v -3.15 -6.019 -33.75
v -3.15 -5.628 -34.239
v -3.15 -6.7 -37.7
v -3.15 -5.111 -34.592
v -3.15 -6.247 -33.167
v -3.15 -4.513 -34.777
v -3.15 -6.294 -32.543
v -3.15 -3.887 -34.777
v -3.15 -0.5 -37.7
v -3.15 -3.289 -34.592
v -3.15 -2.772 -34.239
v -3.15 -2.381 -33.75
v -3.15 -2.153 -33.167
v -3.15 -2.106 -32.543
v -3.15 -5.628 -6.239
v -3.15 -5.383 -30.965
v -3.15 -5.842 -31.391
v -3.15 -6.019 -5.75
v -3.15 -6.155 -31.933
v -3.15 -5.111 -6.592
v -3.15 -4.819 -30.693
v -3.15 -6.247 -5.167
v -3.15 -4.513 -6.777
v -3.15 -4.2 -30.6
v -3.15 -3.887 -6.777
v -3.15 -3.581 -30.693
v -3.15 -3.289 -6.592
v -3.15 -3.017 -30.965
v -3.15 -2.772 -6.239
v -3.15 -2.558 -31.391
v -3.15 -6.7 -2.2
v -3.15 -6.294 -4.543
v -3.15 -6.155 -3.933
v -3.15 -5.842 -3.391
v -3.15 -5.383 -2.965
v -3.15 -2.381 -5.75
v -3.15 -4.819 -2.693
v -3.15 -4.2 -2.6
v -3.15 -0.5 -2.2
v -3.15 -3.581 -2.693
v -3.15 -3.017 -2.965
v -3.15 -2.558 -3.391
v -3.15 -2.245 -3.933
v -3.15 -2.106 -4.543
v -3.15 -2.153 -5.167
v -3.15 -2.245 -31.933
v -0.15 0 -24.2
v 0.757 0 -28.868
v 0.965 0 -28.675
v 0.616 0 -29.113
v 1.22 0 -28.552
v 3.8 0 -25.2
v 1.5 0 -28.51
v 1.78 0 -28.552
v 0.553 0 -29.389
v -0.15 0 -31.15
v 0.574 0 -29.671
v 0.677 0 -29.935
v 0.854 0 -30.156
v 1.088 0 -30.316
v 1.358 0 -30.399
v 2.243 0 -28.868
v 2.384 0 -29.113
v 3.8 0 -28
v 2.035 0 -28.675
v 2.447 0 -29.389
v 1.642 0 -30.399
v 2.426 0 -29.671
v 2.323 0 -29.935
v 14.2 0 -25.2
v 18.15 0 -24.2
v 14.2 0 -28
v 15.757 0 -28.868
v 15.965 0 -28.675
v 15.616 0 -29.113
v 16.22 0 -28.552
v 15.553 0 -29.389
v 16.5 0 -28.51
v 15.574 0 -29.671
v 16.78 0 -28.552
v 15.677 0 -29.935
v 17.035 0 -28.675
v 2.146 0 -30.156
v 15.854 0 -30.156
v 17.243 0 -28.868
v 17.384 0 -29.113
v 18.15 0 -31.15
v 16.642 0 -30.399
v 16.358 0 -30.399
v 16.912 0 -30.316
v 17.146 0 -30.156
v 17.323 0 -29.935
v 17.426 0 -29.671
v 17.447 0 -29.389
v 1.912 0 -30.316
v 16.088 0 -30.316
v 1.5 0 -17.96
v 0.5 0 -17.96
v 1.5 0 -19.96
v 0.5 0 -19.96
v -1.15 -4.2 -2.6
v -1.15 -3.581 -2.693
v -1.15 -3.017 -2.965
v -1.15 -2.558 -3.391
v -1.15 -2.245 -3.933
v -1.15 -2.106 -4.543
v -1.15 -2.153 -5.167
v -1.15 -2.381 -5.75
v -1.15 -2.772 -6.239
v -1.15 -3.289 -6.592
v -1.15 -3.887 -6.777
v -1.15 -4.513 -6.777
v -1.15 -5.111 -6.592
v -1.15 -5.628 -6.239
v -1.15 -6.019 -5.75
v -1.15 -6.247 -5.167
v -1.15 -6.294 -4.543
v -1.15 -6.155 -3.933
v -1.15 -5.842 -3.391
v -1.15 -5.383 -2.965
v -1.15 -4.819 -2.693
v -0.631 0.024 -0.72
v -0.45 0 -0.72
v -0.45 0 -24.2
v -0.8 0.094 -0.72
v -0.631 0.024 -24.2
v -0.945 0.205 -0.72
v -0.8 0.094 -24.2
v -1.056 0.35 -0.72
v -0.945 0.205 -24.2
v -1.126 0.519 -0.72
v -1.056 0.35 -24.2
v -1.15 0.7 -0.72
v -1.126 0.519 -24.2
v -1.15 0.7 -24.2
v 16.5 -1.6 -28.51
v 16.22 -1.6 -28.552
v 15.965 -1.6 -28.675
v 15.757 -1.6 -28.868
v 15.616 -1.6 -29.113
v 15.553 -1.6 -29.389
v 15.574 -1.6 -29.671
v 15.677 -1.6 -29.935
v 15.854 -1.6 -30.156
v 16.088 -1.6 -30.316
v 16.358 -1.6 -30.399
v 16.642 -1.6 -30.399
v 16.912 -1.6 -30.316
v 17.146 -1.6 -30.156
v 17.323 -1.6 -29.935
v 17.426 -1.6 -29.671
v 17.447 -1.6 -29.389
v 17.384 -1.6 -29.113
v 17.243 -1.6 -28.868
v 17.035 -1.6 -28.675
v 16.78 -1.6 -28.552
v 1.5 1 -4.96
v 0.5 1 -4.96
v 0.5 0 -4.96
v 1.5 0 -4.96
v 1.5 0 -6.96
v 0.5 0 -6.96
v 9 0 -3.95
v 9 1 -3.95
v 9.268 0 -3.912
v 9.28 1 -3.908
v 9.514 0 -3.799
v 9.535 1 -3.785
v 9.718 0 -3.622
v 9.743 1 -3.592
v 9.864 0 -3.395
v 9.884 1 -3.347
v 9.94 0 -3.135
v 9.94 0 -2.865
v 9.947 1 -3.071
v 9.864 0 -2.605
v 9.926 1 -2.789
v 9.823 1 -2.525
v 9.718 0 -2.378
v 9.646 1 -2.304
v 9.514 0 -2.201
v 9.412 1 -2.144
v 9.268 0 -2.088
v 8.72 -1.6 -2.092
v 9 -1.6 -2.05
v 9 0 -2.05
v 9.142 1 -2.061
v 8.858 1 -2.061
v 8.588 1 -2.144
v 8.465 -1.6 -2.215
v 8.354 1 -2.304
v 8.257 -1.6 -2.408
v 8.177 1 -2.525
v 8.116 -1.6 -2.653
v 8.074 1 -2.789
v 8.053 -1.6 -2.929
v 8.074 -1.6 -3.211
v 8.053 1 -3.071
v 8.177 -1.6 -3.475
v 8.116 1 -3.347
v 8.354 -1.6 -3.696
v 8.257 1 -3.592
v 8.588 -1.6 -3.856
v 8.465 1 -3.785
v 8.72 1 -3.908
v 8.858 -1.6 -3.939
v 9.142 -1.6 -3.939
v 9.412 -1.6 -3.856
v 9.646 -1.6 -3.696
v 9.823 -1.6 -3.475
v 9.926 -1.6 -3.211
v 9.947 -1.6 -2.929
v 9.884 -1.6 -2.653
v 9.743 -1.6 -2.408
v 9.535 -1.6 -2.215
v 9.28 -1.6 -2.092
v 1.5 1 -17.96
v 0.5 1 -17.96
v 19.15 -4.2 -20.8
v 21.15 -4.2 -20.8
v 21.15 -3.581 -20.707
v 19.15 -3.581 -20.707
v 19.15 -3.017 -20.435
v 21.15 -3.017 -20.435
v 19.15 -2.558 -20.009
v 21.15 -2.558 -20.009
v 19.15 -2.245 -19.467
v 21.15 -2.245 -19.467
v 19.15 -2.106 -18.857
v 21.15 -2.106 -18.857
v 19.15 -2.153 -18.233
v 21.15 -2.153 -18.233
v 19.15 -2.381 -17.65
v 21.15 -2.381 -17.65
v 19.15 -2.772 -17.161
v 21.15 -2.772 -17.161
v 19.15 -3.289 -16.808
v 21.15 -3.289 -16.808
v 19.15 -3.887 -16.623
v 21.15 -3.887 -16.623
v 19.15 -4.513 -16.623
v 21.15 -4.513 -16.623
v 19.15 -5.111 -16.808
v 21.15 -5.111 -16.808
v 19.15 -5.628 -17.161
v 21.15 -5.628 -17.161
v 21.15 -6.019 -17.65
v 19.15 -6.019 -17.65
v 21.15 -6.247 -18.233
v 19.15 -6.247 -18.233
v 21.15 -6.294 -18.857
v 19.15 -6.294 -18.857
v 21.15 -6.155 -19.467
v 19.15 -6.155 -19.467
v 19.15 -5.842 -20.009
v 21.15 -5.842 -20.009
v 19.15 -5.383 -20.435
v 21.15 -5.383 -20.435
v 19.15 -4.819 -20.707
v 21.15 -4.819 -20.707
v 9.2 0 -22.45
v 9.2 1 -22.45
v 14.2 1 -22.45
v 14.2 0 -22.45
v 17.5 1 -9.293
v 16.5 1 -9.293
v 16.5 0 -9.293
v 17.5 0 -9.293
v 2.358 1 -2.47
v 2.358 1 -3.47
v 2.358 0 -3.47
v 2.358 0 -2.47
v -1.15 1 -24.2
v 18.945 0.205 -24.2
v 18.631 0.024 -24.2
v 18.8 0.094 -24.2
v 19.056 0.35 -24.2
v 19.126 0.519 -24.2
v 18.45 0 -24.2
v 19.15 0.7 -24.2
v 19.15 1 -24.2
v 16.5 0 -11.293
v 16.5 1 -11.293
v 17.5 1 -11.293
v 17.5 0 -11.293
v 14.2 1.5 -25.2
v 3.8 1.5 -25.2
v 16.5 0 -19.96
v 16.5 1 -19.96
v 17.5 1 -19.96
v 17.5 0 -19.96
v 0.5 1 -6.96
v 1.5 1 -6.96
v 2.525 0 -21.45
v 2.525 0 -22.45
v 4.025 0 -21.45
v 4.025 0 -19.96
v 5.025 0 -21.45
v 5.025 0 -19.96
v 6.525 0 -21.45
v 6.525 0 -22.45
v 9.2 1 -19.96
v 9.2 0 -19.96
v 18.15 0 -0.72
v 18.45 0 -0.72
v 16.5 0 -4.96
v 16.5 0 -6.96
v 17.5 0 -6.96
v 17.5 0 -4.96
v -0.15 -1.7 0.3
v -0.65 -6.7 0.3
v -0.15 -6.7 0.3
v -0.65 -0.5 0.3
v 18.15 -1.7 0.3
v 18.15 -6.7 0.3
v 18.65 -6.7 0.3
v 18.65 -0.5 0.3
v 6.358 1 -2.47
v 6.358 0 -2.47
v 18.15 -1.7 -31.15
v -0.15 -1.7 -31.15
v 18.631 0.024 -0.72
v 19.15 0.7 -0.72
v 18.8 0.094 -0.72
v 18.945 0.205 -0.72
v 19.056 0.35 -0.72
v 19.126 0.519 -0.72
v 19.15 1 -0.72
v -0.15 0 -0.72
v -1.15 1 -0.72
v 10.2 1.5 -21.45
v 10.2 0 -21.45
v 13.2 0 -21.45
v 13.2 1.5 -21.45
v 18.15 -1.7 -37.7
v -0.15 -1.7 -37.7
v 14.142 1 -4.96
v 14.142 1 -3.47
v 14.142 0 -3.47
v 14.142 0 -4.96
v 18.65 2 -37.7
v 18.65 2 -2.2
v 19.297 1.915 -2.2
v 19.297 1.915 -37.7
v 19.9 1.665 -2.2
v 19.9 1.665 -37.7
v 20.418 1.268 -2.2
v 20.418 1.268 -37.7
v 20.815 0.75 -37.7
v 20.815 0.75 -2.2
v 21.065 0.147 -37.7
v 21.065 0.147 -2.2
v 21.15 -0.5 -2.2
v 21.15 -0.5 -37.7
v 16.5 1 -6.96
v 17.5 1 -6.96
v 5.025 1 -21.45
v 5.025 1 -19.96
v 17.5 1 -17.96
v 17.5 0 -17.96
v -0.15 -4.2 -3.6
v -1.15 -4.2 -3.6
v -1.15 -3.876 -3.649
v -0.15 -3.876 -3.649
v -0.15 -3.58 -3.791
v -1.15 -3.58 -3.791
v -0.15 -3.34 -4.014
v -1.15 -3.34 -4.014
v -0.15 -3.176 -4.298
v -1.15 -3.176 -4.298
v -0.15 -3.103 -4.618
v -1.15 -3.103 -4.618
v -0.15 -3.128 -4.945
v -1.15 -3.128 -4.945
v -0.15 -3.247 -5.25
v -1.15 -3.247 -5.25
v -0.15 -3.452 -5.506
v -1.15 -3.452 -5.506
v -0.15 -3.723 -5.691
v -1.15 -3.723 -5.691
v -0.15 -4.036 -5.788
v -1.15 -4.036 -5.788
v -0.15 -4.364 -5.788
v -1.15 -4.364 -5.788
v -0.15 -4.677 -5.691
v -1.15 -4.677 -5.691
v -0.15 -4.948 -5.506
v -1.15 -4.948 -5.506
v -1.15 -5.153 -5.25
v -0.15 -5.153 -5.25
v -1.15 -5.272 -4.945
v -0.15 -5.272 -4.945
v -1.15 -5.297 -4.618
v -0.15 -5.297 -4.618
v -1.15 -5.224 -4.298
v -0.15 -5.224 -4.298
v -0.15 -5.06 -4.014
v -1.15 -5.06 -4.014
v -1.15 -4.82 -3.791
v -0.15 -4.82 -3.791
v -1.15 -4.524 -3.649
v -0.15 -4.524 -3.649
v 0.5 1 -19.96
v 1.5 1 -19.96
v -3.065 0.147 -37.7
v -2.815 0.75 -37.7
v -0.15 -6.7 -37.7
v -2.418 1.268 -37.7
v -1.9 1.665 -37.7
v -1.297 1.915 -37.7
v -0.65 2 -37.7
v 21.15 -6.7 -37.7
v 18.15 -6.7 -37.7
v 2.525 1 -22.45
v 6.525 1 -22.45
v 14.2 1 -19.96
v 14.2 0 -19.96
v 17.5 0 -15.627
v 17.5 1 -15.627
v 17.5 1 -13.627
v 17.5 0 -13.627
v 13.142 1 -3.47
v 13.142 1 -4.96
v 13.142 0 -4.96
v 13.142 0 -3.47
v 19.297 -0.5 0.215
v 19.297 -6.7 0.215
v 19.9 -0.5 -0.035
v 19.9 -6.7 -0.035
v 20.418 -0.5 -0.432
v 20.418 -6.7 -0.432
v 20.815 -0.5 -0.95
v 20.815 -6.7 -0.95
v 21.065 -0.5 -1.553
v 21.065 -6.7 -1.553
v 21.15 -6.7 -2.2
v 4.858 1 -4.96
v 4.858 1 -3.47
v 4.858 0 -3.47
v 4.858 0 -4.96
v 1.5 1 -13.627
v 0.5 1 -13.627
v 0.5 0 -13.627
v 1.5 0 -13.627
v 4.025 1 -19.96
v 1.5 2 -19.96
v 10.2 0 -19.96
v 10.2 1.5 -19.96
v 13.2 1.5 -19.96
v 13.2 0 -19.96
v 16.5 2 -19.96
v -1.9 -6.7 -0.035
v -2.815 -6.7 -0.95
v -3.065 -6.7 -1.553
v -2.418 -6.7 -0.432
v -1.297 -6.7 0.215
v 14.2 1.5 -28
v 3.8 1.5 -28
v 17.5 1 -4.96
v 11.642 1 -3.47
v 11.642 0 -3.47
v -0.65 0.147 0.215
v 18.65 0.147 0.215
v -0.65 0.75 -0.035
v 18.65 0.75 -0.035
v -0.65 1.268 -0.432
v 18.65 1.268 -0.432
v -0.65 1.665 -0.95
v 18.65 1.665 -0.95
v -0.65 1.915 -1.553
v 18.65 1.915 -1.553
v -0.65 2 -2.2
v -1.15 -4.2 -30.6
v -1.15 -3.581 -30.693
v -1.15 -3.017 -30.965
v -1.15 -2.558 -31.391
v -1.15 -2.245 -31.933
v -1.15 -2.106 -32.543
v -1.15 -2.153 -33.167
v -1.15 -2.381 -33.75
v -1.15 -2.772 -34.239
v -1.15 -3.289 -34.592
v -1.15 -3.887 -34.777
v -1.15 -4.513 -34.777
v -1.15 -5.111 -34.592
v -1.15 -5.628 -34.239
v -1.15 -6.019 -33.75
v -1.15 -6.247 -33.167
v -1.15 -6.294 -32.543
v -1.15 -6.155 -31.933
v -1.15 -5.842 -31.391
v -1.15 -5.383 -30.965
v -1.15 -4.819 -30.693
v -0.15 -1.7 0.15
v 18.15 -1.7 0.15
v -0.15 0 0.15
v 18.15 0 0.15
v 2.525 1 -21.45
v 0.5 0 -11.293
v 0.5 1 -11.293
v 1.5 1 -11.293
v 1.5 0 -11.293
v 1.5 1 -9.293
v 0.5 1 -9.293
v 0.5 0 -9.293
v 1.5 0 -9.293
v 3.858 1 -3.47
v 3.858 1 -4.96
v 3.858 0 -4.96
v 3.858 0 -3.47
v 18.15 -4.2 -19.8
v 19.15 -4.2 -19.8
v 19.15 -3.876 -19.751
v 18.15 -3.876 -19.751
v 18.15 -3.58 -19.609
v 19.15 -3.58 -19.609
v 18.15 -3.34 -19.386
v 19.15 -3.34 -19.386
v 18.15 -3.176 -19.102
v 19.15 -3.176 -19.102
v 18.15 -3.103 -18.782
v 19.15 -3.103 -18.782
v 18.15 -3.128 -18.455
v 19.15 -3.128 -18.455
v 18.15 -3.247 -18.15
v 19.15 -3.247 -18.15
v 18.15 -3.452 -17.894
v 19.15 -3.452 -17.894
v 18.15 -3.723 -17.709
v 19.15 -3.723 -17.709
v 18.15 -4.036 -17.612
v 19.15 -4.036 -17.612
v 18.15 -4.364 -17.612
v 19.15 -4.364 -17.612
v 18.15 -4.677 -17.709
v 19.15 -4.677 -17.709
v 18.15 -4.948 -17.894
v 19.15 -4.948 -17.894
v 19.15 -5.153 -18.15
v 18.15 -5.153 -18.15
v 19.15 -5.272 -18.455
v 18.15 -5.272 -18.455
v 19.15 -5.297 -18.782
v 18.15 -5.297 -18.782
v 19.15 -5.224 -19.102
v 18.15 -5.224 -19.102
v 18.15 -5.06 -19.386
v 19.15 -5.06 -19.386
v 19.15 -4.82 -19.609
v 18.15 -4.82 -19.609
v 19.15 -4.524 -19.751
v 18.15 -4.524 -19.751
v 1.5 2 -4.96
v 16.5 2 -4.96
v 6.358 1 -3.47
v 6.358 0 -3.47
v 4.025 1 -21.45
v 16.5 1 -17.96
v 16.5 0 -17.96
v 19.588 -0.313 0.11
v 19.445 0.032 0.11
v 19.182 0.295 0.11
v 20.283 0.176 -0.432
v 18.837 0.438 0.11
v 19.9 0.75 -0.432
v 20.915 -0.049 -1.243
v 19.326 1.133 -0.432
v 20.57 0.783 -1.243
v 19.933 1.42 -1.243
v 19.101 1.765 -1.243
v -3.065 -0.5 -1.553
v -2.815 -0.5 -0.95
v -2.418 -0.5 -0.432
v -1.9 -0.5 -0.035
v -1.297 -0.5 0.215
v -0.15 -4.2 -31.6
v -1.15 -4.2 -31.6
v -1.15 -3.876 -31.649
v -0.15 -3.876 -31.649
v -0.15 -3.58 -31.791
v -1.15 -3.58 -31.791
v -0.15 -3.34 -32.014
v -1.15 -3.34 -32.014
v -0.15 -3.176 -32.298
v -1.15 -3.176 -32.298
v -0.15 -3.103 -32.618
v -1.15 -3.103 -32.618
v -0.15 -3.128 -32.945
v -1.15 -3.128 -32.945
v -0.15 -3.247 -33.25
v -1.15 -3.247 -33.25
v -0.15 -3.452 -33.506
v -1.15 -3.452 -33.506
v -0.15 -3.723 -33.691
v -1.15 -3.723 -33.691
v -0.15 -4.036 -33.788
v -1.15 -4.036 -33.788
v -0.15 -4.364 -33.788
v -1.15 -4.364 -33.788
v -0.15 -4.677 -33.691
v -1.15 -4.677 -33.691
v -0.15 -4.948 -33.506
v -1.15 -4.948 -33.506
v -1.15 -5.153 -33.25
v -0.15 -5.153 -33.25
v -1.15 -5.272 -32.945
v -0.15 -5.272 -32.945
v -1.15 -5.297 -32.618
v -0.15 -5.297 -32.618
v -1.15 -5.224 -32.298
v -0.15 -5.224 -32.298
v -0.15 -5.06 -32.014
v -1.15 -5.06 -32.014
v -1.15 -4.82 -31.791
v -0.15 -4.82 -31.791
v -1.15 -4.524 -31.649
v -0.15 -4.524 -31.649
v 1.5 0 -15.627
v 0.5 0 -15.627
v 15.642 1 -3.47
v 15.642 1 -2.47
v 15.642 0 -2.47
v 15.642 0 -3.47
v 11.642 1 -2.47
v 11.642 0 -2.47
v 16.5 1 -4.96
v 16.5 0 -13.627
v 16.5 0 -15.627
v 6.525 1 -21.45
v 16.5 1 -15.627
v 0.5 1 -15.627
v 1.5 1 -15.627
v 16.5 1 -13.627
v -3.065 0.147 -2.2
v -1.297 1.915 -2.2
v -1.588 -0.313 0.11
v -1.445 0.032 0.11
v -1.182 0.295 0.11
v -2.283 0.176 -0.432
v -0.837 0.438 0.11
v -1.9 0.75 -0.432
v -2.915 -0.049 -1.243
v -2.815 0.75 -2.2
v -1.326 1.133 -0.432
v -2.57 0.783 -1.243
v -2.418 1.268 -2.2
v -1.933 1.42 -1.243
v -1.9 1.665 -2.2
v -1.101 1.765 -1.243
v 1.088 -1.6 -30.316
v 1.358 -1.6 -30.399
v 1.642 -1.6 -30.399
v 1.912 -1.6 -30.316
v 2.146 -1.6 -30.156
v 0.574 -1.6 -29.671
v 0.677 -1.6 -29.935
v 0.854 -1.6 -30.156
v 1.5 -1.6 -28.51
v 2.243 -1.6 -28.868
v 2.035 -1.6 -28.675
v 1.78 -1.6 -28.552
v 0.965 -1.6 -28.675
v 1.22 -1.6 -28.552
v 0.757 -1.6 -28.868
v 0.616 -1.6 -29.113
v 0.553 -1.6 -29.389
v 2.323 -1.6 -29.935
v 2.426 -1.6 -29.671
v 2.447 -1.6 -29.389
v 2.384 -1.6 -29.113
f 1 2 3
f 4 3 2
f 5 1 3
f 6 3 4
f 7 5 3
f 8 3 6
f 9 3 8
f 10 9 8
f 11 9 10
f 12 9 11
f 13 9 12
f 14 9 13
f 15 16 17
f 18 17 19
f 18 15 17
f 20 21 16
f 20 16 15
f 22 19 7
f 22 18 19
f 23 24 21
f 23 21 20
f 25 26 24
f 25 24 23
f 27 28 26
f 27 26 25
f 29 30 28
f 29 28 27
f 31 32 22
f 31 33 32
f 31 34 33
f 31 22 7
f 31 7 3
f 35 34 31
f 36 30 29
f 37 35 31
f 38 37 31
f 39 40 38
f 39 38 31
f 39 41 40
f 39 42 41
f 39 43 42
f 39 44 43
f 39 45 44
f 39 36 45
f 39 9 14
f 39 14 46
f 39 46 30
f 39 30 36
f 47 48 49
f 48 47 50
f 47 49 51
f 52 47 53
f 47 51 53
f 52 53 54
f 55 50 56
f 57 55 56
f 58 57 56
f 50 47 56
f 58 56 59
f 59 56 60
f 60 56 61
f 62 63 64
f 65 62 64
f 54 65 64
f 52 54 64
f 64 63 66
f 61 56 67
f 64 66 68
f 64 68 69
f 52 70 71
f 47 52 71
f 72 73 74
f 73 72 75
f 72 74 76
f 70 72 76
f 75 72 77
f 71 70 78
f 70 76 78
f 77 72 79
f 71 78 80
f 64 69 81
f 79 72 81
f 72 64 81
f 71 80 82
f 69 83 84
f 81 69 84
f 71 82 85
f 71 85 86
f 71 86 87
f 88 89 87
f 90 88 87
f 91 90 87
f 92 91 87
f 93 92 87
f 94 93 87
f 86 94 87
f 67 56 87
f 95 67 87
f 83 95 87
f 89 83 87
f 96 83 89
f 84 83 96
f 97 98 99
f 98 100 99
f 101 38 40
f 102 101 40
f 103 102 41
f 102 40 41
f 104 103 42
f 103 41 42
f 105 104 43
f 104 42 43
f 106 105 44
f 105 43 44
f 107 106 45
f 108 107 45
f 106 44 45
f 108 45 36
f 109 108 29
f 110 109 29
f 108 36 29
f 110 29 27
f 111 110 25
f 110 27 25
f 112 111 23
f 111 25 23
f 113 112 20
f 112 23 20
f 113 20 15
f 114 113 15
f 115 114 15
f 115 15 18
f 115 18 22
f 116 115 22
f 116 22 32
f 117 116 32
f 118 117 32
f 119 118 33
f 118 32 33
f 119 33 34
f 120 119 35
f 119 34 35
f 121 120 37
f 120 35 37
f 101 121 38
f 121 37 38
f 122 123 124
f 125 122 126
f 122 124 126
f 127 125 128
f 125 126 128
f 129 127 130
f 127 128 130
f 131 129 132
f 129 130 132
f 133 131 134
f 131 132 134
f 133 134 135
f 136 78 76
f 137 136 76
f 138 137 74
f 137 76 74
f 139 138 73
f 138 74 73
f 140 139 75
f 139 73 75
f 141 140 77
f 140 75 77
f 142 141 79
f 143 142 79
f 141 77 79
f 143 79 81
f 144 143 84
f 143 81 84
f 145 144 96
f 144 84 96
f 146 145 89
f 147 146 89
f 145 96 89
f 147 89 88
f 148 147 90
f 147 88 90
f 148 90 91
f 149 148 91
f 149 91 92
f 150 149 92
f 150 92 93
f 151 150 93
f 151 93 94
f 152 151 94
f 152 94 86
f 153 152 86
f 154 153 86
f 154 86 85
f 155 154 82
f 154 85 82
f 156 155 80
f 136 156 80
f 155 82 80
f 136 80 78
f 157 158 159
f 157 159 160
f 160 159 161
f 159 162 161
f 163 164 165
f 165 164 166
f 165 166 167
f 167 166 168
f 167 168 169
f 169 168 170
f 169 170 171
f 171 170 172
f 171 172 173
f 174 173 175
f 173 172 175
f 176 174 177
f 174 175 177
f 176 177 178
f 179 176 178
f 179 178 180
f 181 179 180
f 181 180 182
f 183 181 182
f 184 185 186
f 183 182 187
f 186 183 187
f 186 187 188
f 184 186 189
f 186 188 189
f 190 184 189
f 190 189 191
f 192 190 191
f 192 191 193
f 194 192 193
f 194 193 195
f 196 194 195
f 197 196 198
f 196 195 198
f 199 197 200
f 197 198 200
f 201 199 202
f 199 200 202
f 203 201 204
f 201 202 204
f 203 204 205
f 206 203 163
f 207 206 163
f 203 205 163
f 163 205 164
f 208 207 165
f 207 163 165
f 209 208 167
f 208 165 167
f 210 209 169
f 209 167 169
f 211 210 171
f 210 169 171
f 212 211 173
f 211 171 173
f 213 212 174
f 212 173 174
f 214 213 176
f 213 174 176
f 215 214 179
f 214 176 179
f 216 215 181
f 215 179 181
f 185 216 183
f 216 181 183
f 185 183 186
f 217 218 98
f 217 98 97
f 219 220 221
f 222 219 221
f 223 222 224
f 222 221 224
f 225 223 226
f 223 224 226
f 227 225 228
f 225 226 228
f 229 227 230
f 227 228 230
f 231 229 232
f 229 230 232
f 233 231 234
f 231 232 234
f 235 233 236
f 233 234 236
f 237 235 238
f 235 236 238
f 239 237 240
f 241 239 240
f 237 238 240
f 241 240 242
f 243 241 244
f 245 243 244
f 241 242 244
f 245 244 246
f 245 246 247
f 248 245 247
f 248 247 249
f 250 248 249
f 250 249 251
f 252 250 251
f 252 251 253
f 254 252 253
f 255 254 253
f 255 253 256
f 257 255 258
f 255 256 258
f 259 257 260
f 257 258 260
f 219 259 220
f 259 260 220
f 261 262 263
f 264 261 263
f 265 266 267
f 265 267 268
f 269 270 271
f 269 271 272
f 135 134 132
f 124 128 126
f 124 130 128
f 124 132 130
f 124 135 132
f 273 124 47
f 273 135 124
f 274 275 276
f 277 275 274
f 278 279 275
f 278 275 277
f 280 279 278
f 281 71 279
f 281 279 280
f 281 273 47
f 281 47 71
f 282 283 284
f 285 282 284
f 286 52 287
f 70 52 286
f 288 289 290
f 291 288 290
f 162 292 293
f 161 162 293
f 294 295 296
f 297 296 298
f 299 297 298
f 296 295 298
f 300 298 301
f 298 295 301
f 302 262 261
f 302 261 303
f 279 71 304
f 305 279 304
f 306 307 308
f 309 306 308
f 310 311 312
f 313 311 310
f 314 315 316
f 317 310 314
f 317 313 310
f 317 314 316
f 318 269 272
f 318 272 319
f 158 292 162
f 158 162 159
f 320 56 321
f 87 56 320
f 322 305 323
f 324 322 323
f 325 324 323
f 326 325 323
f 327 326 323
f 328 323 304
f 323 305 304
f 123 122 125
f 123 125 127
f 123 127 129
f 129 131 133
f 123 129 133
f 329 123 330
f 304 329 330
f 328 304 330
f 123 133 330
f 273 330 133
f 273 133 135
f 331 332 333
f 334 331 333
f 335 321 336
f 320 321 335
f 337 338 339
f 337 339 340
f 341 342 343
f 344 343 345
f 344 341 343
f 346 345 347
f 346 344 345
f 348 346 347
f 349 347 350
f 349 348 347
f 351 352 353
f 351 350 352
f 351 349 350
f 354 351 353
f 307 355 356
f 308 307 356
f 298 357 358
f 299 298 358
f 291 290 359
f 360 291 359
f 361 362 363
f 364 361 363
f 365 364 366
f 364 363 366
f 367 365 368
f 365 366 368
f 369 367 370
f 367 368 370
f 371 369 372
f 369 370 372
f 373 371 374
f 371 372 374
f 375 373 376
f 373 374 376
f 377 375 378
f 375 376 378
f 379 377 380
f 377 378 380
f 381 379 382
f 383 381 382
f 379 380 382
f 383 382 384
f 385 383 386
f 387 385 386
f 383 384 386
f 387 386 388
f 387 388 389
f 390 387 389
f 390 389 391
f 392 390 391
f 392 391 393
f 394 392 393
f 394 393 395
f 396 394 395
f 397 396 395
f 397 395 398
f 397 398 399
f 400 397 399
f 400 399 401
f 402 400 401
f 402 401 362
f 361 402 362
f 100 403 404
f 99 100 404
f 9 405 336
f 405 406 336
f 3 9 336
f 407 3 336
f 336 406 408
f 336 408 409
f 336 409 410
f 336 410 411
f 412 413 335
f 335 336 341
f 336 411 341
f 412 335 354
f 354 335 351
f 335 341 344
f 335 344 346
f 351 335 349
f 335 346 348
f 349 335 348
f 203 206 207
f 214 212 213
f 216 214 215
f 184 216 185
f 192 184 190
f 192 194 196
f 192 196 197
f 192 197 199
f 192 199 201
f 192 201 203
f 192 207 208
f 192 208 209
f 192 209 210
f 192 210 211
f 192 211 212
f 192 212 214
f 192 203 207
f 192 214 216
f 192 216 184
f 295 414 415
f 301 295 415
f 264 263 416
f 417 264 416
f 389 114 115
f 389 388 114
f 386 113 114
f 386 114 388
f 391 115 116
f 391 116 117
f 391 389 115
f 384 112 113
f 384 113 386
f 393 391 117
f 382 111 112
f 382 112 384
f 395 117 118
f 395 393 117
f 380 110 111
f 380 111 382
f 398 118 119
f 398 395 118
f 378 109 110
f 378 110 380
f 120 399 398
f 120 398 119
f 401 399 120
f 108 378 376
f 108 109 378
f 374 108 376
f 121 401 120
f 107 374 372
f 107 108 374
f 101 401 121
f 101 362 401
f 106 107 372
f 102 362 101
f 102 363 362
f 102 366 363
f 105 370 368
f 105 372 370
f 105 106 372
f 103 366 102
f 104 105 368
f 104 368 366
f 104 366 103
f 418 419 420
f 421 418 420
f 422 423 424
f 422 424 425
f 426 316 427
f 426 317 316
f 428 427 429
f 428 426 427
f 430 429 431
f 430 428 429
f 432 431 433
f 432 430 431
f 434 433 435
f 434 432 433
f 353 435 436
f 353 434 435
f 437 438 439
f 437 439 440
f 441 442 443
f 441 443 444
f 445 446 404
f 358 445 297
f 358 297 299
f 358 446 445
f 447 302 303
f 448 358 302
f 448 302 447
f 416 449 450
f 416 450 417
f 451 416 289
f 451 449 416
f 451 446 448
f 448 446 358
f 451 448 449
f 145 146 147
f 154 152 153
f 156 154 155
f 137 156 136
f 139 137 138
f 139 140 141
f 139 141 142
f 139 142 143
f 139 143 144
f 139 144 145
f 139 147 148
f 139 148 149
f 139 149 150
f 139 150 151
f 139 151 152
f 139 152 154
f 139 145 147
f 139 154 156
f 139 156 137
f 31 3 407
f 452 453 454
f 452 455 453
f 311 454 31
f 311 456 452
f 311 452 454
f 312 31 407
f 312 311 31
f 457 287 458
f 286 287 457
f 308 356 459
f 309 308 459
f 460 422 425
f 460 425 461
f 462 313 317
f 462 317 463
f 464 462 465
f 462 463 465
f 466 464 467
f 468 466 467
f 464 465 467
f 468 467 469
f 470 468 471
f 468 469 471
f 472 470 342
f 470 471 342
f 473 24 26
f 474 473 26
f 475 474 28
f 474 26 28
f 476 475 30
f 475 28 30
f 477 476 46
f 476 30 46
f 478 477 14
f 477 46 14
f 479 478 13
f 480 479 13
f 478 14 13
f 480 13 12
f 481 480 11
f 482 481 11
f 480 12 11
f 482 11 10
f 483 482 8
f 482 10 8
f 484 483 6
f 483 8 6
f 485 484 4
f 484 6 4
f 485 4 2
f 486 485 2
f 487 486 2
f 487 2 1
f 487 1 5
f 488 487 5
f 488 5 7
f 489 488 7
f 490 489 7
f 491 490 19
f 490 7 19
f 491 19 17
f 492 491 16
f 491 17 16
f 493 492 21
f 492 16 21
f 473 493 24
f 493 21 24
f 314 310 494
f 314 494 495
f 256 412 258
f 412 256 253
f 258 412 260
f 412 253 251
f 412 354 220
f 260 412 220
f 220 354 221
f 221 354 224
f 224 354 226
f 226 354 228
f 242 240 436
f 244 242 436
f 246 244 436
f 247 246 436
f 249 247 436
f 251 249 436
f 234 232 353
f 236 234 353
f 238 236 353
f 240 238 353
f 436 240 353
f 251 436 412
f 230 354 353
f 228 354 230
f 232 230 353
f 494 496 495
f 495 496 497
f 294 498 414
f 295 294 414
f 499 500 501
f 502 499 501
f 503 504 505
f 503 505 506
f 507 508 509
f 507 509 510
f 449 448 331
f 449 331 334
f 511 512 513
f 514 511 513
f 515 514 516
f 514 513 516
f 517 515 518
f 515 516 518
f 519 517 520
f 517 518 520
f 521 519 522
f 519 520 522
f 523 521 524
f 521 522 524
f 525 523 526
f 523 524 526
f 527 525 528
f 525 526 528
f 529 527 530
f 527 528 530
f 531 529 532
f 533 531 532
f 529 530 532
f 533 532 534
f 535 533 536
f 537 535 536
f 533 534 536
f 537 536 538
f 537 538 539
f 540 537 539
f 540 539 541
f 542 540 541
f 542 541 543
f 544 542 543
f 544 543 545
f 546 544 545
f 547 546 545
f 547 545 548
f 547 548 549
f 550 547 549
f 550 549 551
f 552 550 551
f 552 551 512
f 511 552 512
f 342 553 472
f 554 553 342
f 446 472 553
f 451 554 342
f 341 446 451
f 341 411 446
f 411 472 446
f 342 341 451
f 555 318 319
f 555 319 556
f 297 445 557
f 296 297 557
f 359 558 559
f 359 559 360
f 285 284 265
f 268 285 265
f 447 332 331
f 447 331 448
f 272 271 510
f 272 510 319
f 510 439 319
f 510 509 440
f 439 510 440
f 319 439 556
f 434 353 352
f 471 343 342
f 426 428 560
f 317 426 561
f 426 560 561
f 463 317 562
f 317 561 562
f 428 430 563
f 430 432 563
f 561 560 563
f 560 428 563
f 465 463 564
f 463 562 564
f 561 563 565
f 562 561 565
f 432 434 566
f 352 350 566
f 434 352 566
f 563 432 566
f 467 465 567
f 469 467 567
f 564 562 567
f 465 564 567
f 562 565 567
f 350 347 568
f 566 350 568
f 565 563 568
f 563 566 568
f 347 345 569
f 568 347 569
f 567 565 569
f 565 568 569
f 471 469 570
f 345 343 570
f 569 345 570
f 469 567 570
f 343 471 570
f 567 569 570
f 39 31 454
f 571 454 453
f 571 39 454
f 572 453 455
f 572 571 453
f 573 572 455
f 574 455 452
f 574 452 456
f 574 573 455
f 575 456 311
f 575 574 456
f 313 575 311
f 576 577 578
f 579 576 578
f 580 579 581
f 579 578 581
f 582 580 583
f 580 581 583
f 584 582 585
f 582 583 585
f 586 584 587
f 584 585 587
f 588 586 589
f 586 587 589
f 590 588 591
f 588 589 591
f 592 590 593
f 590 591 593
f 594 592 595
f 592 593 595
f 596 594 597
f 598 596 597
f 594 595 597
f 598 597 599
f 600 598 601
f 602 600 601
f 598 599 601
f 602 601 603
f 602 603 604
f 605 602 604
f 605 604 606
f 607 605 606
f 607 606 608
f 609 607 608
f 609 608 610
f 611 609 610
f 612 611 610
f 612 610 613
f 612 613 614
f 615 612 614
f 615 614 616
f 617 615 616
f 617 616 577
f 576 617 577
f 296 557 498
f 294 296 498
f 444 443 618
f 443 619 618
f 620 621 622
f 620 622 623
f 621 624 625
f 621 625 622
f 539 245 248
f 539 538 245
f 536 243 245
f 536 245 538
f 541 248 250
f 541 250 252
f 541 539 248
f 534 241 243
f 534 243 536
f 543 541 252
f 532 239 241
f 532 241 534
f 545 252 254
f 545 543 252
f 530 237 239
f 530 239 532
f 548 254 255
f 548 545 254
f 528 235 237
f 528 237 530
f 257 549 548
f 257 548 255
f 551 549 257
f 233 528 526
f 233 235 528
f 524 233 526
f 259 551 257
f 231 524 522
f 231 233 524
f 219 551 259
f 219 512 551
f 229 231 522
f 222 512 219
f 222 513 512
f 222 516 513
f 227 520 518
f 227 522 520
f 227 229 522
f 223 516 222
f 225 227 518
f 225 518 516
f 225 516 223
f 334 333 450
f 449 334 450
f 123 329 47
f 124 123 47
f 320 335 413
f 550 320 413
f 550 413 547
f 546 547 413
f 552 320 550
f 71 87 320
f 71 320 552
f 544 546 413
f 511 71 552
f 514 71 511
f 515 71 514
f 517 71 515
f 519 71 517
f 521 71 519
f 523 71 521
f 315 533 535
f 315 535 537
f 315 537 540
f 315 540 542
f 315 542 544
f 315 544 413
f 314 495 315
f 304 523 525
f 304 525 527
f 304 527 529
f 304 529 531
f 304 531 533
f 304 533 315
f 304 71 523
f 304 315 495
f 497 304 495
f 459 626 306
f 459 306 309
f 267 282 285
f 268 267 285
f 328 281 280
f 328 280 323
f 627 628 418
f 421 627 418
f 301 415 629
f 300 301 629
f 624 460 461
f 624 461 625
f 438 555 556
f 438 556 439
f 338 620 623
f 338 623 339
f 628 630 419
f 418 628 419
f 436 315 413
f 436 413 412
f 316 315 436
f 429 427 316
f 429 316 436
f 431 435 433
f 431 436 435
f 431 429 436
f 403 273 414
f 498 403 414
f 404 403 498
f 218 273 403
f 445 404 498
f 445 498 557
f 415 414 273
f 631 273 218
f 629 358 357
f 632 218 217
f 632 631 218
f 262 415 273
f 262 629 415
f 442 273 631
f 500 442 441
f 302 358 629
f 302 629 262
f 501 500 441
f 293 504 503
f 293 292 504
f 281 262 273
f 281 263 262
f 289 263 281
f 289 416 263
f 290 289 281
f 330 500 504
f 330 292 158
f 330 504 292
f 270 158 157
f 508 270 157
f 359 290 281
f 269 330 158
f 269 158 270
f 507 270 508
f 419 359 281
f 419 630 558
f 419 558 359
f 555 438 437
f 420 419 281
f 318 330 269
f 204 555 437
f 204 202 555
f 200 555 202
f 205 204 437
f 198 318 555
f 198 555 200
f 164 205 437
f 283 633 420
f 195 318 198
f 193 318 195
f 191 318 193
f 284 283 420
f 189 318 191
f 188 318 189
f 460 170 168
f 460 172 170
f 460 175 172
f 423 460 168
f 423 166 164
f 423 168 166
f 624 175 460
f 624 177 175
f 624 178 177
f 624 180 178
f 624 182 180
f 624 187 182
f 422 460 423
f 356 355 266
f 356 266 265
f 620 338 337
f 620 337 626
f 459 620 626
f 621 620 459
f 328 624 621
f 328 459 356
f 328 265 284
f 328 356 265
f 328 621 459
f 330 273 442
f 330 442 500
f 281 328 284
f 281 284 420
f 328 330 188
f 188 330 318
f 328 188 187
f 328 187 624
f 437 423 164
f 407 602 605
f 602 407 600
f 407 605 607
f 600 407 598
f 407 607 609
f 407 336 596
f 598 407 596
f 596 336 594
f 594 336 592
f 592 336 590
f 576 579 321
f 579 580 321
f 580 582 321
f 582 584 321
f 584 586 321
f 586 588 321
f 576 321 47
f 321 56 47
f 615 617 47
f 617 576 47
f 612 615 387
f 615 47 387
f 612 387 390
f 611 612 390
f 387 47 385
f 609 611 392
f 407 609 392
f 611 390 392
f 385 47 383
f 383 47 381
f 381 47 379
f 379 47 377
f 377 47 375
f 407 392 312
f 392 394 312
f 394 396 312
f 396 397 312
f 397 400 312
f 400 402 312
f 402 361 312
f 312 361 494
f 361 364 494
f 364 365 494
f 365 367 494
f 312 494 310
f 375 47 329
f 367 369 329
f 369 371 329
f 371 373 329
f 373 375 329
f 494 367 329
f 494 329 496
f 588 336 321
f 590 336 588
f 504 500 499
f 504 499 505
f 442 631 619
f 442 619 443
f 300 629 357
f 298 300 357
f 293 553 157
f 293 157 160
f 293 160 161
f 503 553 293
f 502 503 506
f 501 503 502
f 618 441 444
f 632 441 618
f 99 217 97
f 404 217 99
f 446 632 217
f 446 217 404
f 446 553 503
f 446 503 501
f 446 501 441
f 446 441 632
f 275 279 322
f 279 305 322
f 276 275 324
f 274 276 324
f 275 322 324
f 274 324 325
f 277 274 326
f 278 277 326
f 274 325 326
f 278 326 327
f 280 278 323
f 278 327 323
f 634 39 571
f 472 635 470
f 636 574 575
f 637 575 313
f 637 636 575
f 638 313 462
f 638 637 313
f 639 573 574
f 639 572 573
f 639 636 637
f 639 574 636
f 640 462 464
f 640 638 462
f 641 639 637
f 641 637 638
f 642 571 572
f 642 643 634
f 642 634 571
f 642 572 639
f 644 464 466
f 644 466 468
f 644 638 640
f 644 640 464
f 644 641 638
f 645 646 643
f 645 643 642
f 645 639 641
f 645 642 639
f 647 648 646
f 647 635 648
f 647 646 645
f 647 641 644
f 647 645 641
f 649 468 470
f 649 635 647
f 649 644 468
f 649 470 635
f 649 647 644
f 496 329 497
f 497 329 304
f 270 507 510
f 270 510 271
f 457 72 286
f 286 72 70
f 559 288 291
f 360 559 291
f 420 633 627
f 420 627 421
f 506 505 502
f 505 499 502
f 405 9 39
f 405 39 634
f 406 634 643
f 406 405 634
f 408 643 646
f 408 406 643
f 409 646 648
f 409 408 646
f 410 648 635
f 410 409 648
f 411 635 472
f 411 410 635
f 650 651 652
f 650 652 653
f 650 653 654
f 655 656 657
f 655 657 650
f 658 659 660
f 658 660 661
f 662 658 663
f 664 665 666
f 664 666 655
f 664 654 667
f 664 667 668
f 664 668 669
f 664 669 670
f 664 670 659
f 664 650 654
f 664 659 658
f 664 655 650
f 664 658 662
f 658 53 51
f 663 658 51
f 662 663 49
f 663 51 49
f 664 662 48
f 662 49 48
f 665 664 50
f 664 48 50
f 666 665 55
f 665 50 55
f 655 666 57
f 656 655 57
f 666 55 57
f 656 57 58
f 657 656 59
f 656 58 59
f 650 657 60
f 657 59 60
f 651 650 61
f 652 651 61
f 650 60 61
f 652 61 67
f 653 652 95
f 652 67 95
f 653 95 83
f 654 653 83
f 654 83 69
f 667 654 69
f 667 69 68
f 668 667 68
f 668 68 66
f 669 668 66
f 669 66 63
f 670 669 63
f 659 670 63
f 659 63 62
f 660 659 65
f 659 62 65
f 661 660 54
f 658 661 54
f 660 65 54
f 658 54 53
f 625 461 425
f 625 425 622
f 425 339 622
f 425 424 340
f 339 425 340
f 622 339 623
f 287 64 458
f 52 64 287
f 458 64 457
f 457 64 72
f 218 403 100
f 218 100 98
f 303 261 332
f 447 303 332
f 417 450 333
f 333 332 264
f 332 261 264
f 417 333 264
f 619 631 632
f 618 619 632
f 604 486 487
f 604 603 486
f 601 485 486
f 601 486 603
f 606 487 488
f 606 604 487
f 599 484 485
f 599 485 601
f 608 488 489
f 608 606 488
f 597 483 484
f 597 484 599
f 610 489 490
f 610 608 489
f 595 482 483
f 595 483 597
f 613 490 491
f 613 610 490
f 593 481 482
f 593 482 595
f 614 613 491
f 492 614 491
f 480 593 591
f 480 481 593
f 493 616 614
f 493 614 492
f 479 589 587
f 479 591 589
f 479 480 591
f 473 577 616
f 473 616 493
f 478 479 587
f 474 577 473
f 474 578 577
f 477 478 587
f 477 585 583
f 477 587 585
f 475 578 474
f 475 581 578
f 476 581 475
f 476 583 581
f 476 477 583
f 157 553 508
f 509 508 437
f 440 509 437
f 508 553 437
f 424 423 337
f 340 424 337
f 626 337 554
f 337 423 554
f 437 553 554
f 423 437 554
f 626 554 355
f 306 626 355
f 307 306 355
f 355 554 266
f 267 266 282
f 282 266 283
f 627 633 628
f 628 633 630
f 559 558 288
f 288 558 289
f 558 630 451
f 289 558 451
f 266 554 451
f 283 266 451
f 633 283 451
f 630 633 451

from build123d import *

# Parameters (mm, degrees)
SKETCH1_W                  = 24.3
SKETCH1_H                  = 38
BASE_DEPTH                 = 2
SKETCH2_W                  = 24.3
SKETCH2_H                  = 38
SKETCH2_W_2                = 18.3
SKETCH2_H_2                = 31.3
PCB_EDGE_WALLS_DEPTH       = 1.7
SKETCH3_R                  = 0.95
PCB_MOUNT_DOWELS_DEPTH     = 1.6
SKETCH4_W                  = 15
SKETCH4_H                  = 15
SILICONE_PAD_HOLE_DEPTH    = 44.385510254
SKETCH6_W                  = 10.4
SKETCH6_H                  = 2.8
WIRE_SOLDERINGS_HOLE_DEPTH = 1.5
SKETCH7_W                  = 3
SKETCH7_H                  = 1.5
CUT_EXTRUDE4_DEPTH         = 1.5
SILICONE_CHANNELS_START    = -1
SKETCH5_R                  = 0.95
SKETCH5_W                  = 5
SKETCH5_H                  = 2.49
SKETCH5_W_2                = 1
SKETCH5_H_2                = 2
SILICONE_CHANNELS_DEPTH    = 1
SKETCH8_W                  = 23.48
SKETCH8_H                  = 1
CUT_EXTRUDE5_DEPTH         = 1
SKETCH9_W                  = 23.48
SKETCH9_H                  = 1
CUT_EXTRUDE6_DEPTH         = 1
FILLET1_R                  = 0.7
SKETCH17_W                 = 3
SKETCH17_H                 = 38
BOSS_EXTRUDE4_DEPTH        = 5
SKETCH19_R                 = 1.1
CUT_EXTRUDE9_DEPTH         = 5
SKETCH20_R                 = 2.1
CUT_EXTRUDE10_DEPTH        = 2
SKETCH21_R                 = 1.1
CUT_EXTRUDE11_DEPTH        = 5
SKETCH22_R                 = 2.1
CUT_EXTRUDE12_DEPTH        = 2
FILLET3_R                  = 2.5


with BuildPart() as part:
    # Sketch1 → base (new body)
    with BuildSketch(Plane(origin=(0, 0, 0), x_dir=(1, 0, 0), z_dir=(0, 1, 0))):
        with Locations((9, 18.7)):
            Rectangle(SKETCH1_W, SKETCH1_H)
    extrude(amount=BASE_DEPTH)

    # Sketch2 → pcb_edge_walls (add)
    with BuildSketch(Plane.XZ):
        with Locations((9, -18.7)):
            Rectangle(SKETCH2_W, SKETCH2_H)
        with Locations((9, -15.5)):
            Rectangle(SKETCH2_W_2, SKETCH2_H_2, mode=Mode.SUBTRACT)
    extrude(amount=PCB_EDGE_WALLS_DEPTH)

    # Sketch3 → pcb_mount_dowels (add)
    with BuildSketch(Plane.XZ):
        with Locations(Location((1.5, -29.46, 0), (0, 0, 90))):
            Circle(SKETCH3_R)
        with Locations(Location((16.5, -29.46, 0), (0, 0, 90))):
            Circle(SKETCH3_R)
        with Locations(Location((9, -3, 0), (0, 0, 90))):
            Circle(SKETCH3_R)
    extrude(amount=PCB_MOUNT_DOWELS_DEPTH)

    # Sketch4 → silicone_pad_hole (cut, through all)
    with BuildSketch(Plane(origin=(0, 2, 0), x_dir=(1, 0, 0), z_dir=(0, 1, 0))):
        with Locations((9, 12.46)):
            Rectangle(SKETCH4_W, SKETCH4_H)
    extrude(amount=-SILICONE_PAD_HOLE_DEPTH, mode=Mode.SUBTRACT)

    # Sketch6 → wire_solderings_hole (cut)
    with BuildSketch(Plane.XZ):
        with Locations((9, -26.6)):
            Rectangle(SKETCH6_W, SKETCH6_H)
    extrude(amount=-WIRE_SOLDERINGS_HOLE_DEPTH, mode=Mode.SUBTRACT)

    # Sketch7 → Cut-Extrude4 (cut)
    with BuildSketch(Plane.XZ):
        with Locations((11.7, -20.7)):
            Rectangle(SKETCH7_W, SKETCH7_H)
    extrude(amount=-CUT_EXTRUDE4_DEPTH, mode=Mode.SUBTRACT)

    # Sketch5 → silicone_channels (cut)
    with BuildSketch(Plane.XZ.offset(SILICONE_CHANNELS_START)):
        Polygon((-0.15, -19.96), (-0.15, -24.2), (18.15, -24.2), (18.15, -0.72), (-0.15, -0.72), align=None)
        with Locations(Location((9, -3, 0), (0, 0, 270))):
            Circle(SKETCH5_R, mode=Mode.SUBTRACT)
        with Locations((11.7, -21.205)):
            Rectangle(SKETCH5_W, SKETCH5_H, mode=Mode.SUBTRACT)
        Polygon((4.025, -19.96), (4.025, -21.45), (2.525, -21.45), (2.525, -22.45), (6.525, -22.45), (6.525, -21.45), (5.025, -21.45), (5.025, -19.96), align=None, mode=Mode.SUBTRACT)
        Polygon((3.858394778, -4.96), (3.858394778, -3.47), (2.358394778, -3.47), (2.358394778, -2.47), (6.358394778, -2.47), (6.358394778, -3.47), (4.858394778, -3.47), (4.858394778, -4.96), align=None, mode=Mode.SUBTRACT)
        Polygon((13.141605222, -4.96), (13.141605222, -3.47), (11.641605222, -3.47), (11.641605222, -2.47), (15.641605222, -2.47), (15.641605222, -3.47), (14.141605222, -3.47), (14.141605222, -4.96), align=None, mode=Mode.SUBTRACT)
        with Locations((1, -5.96)):
            Rectangle(SKETCH5_W_2, SKETCH5_H_2, mode=Mode.SUBTRACT)
        with Locations((1, -10.293333333)):
            Rectangle(SKETCH5_W_2, SKETCH5_H_2, mode=Mode.SUBTRACT)
        with Locations((1, -14.626666667)):
            Rectangle(SKETCH5_W_2, SKETCH5_H_2, mode=Mode.SUBTRACT)
        with Locations((1, -18.96)):
            Rectangle(SKETCH5_W_2, SKETCH5_H_2, mode=Mode.SUBTRACT)
        with Locations((17, -18.96)):
            Rectangle(SKETCH5_W_2, SKETCH5_H_2, mode=Mode.SUBTRACT)
        with Locations((17, -14.626666667)):
            Rectangle(SKETCH5_W_2, SKETCH5_H_2, mode=Mode.SUBTRACT)
        with Locations((17, -10.293333333)):
            Rectangle(SKETCH5_W_2, SKETCH5_H_2, mode=Mode.SUBTRACT)
        with Locations((17, -5.96)):
            Rectangle(SKETCH5_W_2, SKETCH5_H_2, mode=Mode.SUBTRACT)
    extrude(amount=SILICONE_CHANNELS_DEPTH, mode=Mode.SUBTRACT)

    # Sketch8 → Cut-Extrude5 (cut)
    with BuildSketch(Plane(origin=(-0.15, 0, 0), x_dir=(0, 0, -1), z_dir=(1, 0, 0))):
        with Locations((12.46, 0.5)):
            Rectangle(SKETCH8_W, SKETCH8_H)
    extrude(amount=-CUT_EXTRUDE5_DEPTH, mode=Mode.SUBTRACT)

    # Sketch9 → Cut-Extrude6 (cut)
    with BuildSketch(Plane.ZY.offset(-18.15)):
        with Locations((-12.46, 0.5)):
            Rectangle(SKETCH9_W, SKETCH9_H)
    extrude(amount=-CUT_EXTRUDE6_DEPTH, mode=Mode.SUBTRACT)

    # Fillet1
    fillet1_edges = [part.edges().sort_by_distance(p)[0] for p in [
        (-1.15, 0, -12.46),
        (19.15, 0, -12.46),
    ]]
    fillet(fillet1_edges, radius=FILLET1_R)

    # Sketch17 → Boss-Extrude4 (add)
    with BuildSketch(Plane.XZ.offset(1.7)):
        with Locations((-1.65, -18.7)):
            Rectangle(SKETCH17_W, SKETCH17_H)
        with Locations((19.65, -18.7)):
            Rectangle(SKETCH17_W, SKETCH17_H)
    extrude(amount=BOSS_EXTRUDE4_DEPTH)

    # Sketch19 → Cut-Extrude9 (cut)
    with BuildSketch(Plane.ZY.offset(3.15)):
        with Locations((-4.7, -4.2)):
            Circle(SKETCH19_R)
        with Locations((-32.7, -4.2)):
            Circle(SKETCH19_R)
    extrude(amount=-CUT_EXTRUDE9_DEPTH, mode=Mode.SUBTRACT)

    # Sketch20 → Cut-Extrude10 (cut)
    with BuildSketch(Plane.ZY.offset(3.15)):
        with Locations((-4.7, -4.2)):
            Circle(SKETCH20_R)
        with Locations((-32.7, -4.2)):
            Circle(SKETCH20_R)
    extrude(amount=-CUT_EXTRUDE10_DEPTH, mode=Mode.SUBTRACT)

    # Sketch21 → Cut-Extrude11 (cut)
    with BuildSketch(Plane(origin=(21.15, 0, 0), x_dir=(0, 0, -1), z_dir=(1, 0, 0))):
        with Locations((18.7, -4.2)):
            Circle(SKETCH21_R)
    extrude(amount=-CUT_EXTRUDE11_DEPTH, mode=Mode.SUBTRACT)

    # Sketch22 → Cut-Extrude12 (cut)
    with BuildSketch(Plane(origin=(21.15, 0, 0), x_dir=(0, 0, -1), z_dir=(1, 0, 0))):
        with Locations((18.7, -4.2)):
            Circle(SKETCH22_R)
    extrude(amount=-CUT_EXTRUDE12_DEPTH, mode=Mode.SUBTRACT)

    # Fillet3
    fillet3_edges = [part.edges().sort_by_distance(p)[0] for p in [
        (21.15, 2, -18.7),
        (-3.15, 2, -18.7),
        (21.15, -4.2, 0.3),
        (-3.15, -4.2, 0.3),
        (9, 2, 0.3),
    ]]
    fillet(fillet3_edges, radius=FILLET3_R)


solid = part.part
